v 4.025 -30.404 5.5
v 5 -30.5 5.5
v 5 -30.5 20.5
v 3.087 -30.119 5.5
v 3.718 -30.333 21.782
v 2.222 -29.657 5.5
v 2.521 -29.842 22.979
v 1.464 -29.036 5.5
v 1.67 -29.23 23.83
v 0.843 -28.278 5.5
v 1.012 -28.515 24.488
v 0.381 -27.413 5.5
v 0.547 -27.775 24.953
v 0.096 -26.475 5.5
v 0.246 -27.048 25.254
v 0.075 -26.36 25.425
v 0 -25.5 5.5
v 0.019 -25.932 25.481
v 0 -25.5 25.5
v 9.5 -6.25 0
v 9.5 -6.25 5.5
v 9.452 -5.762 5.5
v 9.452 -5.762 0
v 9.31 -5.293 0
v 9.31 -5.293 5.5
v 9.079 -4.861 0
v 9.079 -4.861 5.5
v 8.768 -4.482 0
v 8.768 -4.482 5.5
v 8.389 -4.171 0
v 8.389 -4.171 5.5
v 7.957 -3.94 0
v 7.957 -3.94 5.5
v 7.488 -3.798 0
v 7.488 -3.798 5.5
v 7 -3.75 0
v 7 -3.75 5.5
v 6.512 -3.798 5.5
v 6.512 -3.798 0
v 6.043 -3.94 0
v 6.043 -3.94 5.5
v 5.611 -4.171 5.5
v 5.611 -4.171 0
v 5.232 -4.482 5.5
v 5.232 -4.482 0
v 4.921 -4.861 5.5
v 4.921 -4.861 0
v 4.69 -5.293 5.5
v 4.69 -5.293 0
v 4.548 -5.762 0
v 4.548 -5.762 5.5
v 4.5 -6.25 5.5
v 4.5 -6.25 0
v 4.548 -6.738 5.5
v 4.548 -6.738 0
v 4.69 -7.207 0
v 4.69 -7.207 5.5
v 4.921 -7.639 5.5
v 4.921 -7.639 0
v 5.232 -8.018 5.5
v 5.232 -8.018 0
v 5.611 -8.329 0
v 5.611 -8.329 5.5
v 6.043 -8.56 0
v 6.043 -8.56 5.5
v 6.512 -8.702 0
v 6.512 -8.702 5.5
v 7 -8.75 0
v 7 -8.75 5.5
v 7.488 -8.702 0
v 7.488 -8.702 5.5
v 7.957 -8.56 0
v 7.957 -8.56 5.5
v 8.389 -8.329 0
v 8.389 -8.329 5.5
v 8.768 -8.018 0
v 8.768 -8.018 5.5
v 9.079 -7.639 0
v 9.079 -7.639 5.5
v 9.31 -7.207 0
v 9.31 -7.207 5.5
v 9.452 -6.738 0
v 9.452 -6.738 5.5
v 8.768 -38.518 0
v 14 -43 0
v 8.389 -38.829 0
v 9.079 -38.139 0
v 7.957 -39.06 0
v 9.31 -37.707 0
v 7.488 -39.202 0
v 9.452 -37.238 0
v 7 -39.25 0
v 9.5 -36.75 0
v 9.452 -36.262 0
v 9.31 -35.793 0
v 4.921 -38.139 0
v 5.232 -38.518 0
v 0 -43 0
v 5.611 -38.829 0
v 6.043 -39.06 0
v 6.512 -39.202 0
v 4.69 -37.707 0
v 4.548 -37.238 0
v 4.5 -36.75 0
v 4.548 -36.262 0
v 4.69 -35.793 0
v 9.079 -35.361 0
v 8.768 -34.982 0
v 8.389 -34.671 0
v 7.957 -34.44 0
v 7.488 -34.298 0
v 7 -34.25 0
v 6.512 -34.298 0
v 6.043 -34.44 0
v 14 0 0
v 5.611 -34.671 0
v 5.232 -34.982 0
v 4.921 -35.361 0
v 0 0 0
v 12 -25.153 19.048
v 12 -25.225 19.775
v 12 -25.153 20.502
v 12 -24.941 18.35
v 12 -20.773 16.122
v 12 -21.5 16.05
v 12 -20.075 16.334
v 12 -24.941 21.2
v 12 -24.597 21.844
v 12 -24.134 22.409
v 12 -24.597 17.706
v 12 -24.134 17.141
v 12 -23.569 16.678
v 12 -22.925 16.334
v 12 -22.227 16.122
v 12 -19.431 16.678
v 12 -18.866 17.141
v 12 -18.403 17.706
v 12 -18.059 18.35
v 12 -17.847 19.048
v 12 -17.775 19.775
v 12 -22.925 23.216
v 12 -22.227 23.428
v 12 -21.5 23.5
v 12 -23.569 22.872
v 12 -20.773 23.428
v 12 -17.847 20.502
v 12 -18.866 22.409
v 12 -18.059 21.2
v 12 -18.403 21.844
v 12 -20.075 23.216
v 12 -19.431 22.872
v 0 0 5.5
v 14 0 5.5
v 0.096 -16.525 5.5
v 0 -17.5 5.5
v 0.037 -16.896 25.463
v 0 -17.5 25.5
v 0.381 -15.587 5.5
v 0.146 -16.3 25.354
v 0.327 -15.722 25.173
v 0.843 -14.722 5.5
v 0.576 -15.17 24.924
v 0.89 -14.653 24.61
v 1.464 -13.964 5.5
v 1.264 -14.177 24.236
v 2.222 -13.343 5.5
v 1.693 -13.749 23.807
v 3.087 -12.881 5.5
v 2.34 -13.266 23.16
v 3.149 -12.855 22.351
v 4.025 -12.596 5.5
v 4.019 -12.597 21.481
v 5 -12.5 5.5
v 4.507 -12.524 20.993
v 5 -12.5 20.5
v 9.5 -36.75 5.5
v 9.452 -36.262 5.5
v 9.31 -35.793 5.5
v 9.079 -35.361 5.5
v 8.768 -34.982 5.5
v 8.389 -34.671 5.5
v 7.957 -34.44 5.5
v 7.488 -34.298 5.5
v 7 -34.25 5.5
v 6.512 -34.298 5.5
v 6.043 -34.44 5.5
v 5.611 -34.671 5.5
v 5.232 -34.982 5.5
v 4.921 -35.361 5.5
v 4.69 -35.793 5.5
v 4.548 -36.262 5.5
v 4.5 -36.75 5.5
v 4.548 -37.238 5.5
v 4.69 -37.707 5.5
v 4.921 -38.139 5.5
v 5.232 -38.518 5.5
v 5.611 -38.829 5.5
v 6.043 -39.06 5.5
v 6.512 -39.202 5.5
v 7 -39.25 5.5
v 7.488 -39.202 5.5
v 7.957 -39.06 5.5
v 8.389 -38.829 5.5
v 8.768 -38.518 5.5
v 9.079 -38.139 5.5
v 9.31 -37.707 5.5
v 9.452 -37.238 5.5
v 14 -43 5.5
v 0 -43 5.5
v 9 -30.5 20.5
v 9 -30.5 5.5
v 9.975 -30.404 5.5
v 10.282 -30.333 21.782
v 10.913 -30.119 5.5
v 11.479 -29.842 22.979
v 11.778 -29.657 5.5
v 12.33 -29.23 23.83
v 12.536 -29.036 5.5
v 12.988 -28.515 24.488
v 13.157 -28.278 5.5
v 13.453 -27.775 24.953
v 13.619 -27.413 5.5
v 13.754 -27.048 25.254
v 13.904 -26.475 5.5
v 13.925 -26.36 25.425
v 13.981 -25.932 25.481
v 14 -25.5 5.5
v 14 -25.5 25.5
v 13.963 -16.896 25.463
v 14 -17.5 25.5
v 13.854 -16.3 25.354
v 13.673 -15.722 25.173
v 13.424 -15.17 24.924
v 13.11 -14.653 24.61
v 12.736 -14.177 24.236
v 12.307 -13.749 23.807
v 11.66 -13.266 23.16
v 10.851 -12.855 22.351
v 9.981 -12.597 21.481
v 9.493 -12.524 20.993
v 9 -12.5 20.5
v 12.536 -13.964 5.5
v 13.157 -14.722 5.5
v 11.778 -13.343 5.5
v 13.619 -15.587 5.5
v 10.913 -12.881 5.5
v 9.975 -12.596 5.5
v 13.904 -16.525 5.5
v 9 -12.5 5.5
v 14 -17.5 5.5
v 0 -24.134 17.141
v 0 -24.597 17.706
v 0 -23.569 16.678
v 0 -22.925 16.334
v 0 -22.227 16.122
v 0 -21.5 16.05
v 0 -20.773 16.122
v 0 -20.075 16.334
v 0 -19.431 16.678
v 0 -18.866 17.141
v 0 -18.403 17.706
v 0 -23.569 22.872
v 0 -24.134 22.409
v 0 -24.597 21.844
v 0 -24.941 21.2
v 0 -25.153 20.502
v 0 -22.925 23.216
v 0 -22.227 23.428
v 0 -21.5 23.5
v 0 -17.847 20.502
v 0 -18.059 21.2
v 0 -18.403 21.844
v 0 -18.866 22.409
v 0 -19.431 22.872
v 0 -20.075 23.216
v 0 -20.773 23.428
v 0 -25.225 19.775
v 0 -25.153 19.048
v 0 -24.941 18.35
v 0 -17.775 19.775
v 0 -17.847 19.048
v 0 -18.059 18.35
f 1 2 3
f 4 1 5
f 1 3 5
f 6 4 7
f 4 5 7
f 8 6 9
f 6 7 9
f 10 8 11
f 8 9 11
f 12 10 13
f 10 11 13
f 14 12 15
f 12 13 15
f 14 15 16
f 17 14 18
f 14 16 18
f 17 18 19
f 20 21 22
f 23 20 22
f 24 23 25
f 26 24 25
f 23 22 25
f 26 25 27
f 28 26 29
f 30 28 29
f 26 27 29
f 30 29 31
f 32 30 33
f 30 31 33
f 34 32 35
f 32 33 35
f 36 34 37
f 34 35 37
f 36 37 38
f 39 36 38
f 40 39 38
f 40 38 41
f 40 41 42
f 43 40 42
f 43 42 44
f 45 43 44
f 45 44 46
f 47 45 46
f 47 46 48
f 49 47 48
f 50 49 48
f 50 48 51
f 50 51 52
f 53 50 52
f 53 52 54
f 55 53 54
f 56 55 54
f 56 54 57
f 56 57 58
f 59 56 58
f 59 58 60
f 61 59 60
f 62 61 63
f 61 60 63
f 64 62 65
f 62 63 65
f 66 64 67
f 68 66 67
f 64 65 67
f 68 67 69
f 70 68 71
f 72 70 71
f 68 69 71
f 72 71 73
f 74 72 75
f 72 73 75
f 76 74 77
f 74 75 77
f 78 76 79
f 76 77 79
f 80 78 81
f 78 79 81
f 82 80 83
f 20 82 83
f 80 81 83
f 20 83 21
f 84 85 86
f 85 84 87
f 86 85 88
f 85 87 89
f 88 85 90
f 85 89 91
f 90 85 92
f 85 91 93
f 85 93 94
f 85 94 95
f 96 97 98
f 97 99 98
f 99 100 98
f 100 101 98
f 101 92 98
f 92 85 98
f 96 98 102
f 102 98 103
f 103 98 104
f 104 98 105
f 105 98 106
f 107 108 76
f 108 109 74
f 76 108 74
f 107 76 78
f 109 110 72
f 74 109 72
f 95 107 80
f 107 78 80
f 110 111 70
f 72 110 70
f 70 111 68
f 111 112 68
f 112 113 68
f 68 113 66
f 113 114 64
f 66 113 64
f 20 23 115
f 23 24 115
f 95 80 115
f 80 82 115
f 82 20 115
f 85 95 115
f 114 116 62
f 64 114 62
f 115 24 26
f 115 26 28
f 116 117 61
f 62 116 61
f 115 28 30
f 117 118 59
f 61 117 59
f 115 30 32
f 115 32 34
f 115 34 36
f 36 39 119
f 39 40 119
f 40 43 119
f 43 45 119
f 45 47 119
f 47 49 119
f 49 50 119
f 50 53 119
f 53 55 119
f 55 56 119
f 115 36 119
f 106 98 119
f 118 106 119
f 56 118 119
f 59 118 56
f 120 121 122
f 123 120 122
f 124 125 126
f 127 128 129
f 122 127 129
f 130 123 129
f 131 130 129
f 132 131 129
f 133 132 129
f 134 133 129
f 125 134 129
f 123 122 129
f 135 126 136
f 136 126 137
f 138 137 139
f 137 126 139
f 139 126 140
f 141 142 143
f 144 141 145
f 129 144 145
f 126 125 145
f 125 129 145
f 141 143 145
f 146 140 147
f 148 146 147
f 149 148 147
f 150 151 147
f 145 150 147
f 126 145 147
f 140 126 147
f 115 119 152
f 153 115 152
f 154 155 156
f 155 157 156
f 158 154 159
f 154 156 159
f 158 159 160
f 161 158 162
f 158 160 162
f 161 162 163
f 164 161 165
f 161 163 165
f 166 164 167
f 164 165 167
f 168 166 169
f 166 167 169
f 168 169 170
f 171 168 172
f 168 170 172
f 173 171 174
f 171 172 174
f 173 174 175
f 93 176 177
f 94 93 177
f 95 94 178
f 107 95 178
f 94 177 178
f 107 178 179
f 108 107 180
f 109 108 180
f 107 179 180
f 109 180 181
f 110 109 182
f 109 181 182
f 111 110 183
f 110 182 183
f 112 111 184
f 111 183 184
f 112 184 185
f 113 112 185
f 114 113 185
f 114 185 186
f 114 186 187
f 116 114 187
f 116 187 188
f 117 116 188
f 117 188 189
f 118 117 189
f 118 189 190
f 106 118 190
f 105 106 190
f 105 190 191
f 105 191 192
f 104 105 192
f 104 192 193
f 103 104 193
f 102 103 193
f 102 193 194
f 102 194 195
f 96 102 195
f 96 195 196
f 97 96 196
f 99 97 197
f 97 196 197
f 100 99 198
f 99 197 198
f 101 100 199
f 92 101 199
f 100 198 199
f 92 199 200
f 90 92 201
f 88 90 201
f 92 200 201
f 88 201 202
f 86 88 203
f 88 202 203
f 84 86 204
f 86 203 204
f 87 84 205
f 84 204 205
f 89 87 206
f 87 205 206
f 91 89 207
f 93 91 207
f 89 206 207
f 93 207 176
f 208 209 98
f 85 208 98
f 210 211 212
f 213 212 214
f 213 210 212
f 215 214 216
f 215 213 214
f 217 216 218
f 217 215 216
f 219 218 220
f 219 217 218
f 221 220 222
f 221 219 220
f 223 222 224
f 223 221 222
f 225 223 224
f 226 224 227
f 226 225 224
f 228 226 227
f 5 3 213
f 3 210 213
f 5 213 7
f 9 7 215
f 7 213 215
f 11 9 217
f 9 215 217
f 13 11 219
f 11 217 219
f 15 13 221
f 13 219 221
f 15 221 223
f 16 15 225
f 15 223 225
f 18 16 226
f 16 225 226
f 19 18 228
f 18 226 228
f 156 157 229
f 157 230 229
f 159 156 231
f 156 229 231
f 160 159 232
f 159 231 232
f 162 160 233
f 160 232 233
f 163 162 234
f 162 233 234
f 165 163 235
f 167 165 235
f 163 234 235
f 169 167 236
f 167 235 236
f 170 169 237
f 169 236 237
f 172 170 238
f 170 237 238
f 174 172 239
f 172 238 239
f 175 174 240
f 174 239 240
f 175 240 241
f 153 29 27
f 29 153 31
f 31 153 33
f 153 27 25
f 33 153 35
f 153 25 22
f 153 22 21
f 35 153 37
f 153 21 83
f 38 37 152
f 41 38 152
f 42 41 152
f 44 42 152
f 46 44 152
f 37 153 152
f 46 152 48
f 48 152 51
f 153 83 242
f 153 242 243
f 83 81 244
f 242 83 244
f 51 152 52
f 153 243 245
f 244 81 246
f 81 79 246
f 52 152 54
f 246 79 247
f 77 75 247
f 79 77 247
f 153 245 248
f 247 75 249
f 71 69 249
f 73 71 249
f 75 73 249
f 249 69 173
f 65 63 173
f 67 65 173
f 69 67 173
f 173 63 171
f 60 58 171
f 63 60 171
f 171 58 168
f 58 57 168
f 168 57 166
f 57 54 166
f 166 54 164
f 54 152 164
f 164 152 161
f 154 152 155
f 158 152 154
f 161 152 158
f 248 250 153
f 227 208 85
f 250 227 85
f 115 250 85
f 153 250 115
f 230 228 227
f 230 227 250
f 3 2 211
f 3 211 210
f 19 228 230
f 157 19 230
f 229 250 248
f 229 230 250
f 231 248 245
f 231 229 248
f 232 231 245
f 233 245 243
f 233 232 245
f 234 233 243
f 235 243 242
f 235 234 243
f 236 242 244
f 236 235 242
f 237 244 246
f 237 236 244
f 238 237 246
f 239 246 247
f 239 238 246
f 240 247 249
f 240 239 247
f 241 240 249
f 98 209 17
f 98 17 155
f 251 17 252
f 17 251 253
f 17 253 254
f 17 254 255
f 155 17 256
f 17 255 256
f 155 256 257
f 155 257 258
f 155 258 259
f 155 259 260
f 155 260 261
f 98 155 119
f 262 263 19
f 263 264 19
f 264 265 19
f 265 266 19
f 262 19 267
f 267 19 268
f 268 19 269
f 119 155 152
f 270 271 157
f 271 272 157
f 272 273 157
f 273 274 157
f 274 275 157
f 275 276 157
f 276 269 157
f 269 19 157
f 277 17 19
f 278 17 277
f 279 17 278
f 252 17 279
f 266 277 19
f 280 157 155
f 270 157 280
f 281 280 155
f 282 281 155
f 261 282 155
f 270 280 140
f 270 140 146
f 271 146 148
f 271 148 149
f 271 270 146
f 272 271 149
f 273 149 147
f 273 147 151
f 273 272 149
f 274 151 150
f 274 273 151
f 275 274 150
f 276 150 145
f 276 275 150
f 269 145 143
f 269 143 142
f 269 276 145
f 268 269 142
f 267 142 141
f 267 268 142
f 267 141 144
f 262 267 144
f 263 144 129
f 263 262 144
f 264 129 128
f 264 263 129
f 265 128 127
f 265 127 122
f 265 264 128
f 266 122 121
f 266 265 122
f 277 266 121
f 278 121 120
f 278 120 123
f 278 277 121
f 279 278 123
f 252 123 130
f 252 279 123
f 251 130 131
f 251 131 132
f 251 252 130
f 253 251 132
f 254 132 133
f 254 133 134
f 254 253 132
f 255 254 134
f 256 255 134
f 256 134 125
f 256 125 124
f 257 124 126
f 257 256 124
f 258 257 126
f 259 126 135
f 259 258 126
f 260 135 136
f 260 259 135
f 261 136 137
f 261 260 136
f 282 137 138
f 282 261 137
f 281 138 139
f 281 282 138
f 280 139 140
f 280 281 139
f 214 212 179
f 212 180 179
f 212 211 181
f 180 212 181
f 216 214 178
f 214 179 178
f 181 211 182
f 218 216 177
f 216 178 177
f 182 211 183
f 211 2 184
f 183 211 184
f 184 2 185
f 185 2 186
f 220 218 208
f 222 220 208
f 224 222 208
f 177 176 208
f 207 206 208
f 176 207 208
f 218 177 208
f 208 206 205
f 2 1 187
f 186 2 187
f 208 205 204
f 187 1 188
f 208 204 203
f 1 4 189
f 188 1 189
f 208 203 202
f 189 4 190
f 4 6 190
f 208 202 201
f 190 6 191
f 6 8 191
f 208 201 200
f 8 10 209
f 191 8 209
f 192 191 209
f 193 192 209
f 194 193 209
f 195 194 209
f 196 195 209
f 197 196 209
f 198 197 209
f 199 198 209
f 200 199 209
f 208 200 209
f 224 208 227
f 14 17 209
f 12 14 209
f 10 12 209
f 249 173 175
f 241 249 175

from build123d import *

# Parameters (mm, degrees)
F0_W     = 18
F0_H     = 20
F1_DEPTH = 14
F2_R     = 2.5
F3_DEPTH = 5.8
F4_R     = 5
F5_R     = 3.725
F6_DEPTH = 12


with BuildPart() as f1:
    # F0 (on Right) → F1 (new body)
    with BuildSketch(Plane.YZ):
        with Locations((-21.5, 15.5)):
            Rectangle(F0_W, F0_H)
        Polygon((-43, 0), (0, 0), (0, 5.5), (-12.5, 5.5), (-30.5, 5.5), (-43, 5.5), align=None)
    extrude(amount=F1_DEPTH)

    # F2 (on face) → F3 (cut)
    with BuildSketch(Plane.XY.offset(5.5)):
        with Locations((7, -6.25)):
            Circle(F2_R)
        with Locations((7, -36.75)):
            Circle(F2_R)
    extrude(amount=-F3_DEPTH, mode=Mode.SUBTRACT)

    # F4
    f4_edges = [f1.edges().sort_by_distance(p)[0] for p in [
        (7, -30.5, 25.5),
        (7, -12.5, 25.5),
        (14, -30.5, 15.5),
        (14, -12.5, 15.5),
        (0, -12.5, 15.5),
        (0, -30.5, 15.5),
    ]]
    fillet(f4_edges, radius=F4_R)

    # F5 (on face) → F6 (cut)
    with BuildSketch(Plane.YZ):
        with Locations((-21.5, 19.775)):
            Circle(F5_R)
    extrude(amount=F6_DEPTH, mode=Mode.SUBTRACT)


solid = f1.part
